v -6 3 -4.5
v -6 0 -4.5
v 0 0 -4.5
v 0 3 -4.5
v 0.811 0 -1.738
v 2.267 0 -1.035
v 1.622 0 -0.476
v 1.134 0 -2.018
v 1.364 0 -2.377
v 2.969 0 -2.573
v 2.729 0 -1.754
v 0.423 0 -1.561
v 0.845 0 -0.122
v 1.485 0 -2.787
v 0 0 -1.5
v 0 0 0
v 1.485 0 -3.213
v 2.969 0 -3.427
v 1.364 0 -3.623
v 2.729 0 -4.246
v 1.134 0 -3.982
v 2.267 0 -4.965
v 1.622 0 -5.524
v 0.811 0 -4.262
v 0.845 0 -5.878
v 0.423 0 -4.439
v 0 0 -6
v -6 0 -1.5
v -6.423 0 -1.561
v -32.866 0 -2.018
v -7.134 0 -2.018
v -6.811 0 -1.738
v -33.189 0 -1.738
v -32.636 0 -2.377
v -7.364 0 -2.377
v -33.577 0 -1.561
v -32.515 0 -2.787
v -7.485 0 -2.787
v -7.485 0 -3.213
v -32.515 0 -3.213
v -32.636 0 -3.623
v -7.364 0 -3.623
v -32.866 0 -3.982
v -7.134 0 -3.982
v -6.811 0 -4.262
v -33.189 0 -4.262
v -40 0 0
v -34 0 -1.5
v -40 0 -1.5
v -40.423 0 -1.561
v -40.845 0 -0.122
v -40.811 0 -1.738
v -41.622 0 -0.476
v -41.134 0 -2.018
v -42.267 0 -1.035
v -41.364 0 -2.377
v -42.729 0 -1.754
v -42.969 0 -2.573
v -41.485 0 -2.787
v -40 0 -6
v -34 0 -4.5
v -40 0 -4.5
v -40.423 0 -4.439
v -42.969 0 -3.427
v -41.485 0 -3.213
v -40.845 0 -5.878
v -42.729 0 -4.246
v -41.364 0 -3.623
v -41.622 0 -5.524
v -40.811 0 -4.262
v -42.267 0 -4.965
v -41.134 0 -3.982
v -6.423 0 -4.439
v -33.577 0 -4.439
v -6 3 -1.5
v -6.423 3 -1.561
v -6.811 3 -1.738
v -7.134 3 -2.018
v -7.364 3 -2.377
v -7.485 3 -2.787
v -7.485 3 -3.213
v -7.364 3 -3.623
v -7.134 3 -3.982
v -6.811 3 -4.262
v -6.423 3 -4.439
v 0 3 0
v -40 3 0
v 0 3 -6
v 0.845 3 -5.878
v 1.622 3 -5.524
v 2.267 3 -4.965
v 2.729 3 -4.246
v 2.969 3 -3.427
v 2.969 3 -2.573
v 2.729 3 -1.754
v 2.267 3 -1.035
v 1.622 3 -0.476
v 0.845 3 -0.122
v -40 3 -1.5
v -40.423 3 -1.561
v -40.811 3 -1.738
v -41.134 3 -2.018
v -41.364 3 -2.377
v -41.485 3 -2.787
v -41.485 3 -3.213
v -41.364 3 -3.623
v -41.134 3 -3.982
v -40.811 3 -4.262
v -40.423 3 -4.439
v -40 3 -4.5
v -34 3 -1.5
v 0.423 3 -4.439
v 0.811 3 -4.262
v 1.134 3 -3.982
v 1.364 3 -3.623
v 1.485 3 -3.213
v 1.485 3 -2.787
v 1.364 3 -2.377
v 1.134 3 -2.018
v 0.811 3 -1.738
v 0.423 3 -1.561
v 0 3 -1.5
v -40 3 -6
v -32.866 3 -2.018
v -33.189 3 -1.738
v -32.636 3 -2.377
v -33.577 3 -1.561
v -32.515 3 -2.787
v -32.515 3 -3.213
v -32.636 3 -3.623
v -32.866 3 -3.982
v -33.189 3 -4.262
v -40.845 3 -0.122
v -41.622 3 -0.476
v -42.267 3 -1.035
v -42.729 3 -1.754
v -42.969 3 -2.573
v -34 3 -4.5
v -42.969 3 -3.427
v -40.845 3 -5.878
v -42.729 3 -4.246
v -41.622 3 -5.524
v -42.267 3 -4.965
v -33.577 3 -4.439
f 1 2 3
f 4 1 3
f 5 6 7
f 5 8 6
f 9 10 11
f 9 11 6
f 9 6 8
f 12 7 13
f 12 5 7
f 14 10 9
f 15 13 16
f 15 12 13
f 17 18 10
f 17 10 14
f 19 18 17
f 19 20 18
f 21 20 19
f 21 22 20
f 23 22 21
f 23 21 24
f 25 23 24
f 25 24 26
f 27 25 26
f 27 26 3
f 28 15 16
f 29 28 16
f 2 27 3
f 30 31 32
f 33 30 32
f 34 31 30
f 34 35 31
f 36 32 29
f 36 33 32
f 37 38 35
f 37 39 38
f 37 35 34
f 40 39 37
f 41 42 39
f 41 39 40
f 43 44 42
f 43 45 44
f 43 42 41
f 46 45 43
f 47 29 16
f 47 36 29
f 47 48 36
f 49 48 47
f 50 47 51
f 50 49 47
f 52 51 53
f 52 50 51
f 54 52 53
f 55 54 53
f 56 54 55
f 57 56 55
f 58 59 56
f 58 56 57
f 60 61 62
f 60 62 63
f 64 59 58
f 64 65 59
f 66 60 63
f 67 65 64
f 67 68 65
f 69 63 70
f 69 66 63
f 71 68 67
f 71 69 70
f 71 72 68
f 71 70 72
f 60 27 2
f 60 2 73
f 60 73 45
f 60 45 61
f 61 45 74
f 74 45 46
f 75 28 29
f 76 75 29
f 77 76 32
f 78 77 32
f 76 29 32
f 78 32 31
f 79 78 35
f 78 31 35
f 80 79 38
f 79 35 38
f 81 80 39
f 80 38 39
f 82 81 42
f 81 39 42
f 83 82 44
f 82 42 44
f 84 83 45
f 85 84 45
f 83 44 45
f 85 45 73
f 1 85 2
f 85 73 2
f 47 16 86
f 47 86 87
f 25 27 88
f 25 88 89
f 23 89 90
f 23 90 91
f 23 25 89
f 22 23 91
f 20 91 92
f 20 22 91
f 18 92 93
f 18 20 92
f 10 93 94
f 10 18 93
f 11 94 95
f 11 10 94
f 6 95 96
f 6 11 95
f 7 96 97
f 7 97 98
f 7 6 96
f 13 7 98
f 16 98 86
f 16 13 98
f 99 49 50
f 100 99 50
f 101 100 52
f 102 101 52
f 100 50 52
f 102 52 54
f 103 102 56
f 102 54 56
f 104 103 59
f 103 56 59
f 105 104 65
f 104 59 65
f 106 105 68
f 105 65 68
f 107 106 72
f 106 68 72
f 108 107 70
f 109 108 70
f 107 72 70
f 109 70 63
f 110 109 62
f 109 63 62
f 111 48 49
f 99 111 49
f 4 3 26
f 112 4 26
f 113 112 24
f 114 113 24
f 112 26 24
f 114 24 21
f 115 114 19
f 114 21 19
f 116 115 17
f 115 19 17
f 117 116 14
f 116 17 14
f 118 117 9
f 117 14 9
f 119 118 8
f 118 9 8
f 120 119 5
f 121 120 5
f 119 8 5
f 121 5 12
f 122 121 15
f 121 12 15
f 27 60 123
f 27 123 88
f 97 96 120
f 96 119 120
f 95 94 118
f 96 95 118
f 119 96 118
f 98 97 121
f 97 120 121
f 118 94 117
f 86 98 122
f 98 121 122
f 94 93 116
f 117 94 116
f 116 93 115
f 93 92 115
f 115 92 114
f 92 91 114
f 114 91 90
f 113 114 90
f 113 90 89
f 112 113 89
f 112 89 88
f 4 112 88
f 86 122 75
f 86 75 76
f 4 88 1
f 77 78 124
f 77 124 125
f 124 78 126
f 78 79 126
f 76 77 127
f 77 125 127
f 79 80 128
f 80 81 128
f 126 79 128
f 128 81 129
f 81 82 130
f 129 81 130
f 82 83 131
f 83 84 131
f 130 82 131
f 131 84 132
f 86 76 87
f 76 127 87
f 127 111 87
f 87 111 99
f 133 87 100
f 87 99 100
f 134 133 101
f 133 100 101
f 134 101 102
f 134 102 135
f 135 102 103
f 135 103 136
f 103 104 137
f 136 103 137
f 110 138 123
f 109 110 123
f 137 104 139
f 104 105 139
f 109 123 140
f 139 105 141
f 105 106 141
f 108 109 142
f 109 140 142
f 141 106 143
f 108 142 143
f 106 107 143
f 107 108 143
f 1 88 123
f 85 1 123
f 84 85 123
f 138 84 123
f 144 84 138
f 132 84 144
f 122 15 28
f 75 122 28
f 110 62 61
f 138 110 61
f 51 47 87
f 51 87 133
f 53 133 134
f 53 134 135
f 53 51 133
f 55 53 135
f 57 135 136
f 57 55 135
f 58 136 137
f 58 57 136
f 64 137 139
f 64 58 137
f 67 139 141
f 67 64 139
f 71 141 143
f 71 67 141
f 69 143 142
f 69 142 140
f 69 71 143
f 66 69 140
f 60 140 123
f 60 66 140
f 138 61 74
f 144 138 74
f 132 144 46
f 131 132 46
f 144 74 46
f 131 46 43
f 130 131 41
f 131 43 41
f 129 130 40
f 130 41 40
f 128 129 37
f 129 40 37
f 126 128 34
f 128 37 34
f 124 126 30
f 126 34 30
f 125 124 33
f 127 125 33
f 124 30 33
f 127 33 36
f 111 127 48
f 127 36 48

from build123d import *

# Parameters (mm, degrees)
BOSS_EXTRUDE1_DEPTH = 3


with BuildPart() as part:
    # Sketch1 → Boss-Extrude1 (new body)
    with BuildSketch(Plane(origin=(0, 0, 0), x_dir=(1, 0, 0), z_dir=(0, 1, 0))):
        with BuildLine():
            Line((0, 0), (-40, 0))
            ThreePointArc((-40, 0), (-43, 3), (-40, 6))
            Line((-40, 6), (0, 6))
            ThreePointArc((0, 6), (3, 3), (0, 0))
        make_face()
        with BuildLine():
            Line((-40, 4.5), (-34, 4.5))
            ThreePointArc((-34, 4.5), (-32.5, 3), (-34, 1.5))
            Line((-34, 1.5), (-40, 1.5))
            ThreePointArc((-40, 1.5), (-41.5, 3), (-40, 4.5))
        make_face(mode=Mode.SUBTRACT)
        with BuildLine():
            Line((0, 1.5), (-6, 1.5))
            ThreePointArc((-6, 1.5), (-7.5, 3), (-6, 4.5))
            Line((-6, 4.5), (0, 4.5))
            ThreePointArc((0, 4.5), (1.5, 3), (0, 1.5))
        make_face(mode=Mode.SUBTRACT)
    extrude(amount=BOSS_EXTRUDE1_DEPTH)


solid = part.part
